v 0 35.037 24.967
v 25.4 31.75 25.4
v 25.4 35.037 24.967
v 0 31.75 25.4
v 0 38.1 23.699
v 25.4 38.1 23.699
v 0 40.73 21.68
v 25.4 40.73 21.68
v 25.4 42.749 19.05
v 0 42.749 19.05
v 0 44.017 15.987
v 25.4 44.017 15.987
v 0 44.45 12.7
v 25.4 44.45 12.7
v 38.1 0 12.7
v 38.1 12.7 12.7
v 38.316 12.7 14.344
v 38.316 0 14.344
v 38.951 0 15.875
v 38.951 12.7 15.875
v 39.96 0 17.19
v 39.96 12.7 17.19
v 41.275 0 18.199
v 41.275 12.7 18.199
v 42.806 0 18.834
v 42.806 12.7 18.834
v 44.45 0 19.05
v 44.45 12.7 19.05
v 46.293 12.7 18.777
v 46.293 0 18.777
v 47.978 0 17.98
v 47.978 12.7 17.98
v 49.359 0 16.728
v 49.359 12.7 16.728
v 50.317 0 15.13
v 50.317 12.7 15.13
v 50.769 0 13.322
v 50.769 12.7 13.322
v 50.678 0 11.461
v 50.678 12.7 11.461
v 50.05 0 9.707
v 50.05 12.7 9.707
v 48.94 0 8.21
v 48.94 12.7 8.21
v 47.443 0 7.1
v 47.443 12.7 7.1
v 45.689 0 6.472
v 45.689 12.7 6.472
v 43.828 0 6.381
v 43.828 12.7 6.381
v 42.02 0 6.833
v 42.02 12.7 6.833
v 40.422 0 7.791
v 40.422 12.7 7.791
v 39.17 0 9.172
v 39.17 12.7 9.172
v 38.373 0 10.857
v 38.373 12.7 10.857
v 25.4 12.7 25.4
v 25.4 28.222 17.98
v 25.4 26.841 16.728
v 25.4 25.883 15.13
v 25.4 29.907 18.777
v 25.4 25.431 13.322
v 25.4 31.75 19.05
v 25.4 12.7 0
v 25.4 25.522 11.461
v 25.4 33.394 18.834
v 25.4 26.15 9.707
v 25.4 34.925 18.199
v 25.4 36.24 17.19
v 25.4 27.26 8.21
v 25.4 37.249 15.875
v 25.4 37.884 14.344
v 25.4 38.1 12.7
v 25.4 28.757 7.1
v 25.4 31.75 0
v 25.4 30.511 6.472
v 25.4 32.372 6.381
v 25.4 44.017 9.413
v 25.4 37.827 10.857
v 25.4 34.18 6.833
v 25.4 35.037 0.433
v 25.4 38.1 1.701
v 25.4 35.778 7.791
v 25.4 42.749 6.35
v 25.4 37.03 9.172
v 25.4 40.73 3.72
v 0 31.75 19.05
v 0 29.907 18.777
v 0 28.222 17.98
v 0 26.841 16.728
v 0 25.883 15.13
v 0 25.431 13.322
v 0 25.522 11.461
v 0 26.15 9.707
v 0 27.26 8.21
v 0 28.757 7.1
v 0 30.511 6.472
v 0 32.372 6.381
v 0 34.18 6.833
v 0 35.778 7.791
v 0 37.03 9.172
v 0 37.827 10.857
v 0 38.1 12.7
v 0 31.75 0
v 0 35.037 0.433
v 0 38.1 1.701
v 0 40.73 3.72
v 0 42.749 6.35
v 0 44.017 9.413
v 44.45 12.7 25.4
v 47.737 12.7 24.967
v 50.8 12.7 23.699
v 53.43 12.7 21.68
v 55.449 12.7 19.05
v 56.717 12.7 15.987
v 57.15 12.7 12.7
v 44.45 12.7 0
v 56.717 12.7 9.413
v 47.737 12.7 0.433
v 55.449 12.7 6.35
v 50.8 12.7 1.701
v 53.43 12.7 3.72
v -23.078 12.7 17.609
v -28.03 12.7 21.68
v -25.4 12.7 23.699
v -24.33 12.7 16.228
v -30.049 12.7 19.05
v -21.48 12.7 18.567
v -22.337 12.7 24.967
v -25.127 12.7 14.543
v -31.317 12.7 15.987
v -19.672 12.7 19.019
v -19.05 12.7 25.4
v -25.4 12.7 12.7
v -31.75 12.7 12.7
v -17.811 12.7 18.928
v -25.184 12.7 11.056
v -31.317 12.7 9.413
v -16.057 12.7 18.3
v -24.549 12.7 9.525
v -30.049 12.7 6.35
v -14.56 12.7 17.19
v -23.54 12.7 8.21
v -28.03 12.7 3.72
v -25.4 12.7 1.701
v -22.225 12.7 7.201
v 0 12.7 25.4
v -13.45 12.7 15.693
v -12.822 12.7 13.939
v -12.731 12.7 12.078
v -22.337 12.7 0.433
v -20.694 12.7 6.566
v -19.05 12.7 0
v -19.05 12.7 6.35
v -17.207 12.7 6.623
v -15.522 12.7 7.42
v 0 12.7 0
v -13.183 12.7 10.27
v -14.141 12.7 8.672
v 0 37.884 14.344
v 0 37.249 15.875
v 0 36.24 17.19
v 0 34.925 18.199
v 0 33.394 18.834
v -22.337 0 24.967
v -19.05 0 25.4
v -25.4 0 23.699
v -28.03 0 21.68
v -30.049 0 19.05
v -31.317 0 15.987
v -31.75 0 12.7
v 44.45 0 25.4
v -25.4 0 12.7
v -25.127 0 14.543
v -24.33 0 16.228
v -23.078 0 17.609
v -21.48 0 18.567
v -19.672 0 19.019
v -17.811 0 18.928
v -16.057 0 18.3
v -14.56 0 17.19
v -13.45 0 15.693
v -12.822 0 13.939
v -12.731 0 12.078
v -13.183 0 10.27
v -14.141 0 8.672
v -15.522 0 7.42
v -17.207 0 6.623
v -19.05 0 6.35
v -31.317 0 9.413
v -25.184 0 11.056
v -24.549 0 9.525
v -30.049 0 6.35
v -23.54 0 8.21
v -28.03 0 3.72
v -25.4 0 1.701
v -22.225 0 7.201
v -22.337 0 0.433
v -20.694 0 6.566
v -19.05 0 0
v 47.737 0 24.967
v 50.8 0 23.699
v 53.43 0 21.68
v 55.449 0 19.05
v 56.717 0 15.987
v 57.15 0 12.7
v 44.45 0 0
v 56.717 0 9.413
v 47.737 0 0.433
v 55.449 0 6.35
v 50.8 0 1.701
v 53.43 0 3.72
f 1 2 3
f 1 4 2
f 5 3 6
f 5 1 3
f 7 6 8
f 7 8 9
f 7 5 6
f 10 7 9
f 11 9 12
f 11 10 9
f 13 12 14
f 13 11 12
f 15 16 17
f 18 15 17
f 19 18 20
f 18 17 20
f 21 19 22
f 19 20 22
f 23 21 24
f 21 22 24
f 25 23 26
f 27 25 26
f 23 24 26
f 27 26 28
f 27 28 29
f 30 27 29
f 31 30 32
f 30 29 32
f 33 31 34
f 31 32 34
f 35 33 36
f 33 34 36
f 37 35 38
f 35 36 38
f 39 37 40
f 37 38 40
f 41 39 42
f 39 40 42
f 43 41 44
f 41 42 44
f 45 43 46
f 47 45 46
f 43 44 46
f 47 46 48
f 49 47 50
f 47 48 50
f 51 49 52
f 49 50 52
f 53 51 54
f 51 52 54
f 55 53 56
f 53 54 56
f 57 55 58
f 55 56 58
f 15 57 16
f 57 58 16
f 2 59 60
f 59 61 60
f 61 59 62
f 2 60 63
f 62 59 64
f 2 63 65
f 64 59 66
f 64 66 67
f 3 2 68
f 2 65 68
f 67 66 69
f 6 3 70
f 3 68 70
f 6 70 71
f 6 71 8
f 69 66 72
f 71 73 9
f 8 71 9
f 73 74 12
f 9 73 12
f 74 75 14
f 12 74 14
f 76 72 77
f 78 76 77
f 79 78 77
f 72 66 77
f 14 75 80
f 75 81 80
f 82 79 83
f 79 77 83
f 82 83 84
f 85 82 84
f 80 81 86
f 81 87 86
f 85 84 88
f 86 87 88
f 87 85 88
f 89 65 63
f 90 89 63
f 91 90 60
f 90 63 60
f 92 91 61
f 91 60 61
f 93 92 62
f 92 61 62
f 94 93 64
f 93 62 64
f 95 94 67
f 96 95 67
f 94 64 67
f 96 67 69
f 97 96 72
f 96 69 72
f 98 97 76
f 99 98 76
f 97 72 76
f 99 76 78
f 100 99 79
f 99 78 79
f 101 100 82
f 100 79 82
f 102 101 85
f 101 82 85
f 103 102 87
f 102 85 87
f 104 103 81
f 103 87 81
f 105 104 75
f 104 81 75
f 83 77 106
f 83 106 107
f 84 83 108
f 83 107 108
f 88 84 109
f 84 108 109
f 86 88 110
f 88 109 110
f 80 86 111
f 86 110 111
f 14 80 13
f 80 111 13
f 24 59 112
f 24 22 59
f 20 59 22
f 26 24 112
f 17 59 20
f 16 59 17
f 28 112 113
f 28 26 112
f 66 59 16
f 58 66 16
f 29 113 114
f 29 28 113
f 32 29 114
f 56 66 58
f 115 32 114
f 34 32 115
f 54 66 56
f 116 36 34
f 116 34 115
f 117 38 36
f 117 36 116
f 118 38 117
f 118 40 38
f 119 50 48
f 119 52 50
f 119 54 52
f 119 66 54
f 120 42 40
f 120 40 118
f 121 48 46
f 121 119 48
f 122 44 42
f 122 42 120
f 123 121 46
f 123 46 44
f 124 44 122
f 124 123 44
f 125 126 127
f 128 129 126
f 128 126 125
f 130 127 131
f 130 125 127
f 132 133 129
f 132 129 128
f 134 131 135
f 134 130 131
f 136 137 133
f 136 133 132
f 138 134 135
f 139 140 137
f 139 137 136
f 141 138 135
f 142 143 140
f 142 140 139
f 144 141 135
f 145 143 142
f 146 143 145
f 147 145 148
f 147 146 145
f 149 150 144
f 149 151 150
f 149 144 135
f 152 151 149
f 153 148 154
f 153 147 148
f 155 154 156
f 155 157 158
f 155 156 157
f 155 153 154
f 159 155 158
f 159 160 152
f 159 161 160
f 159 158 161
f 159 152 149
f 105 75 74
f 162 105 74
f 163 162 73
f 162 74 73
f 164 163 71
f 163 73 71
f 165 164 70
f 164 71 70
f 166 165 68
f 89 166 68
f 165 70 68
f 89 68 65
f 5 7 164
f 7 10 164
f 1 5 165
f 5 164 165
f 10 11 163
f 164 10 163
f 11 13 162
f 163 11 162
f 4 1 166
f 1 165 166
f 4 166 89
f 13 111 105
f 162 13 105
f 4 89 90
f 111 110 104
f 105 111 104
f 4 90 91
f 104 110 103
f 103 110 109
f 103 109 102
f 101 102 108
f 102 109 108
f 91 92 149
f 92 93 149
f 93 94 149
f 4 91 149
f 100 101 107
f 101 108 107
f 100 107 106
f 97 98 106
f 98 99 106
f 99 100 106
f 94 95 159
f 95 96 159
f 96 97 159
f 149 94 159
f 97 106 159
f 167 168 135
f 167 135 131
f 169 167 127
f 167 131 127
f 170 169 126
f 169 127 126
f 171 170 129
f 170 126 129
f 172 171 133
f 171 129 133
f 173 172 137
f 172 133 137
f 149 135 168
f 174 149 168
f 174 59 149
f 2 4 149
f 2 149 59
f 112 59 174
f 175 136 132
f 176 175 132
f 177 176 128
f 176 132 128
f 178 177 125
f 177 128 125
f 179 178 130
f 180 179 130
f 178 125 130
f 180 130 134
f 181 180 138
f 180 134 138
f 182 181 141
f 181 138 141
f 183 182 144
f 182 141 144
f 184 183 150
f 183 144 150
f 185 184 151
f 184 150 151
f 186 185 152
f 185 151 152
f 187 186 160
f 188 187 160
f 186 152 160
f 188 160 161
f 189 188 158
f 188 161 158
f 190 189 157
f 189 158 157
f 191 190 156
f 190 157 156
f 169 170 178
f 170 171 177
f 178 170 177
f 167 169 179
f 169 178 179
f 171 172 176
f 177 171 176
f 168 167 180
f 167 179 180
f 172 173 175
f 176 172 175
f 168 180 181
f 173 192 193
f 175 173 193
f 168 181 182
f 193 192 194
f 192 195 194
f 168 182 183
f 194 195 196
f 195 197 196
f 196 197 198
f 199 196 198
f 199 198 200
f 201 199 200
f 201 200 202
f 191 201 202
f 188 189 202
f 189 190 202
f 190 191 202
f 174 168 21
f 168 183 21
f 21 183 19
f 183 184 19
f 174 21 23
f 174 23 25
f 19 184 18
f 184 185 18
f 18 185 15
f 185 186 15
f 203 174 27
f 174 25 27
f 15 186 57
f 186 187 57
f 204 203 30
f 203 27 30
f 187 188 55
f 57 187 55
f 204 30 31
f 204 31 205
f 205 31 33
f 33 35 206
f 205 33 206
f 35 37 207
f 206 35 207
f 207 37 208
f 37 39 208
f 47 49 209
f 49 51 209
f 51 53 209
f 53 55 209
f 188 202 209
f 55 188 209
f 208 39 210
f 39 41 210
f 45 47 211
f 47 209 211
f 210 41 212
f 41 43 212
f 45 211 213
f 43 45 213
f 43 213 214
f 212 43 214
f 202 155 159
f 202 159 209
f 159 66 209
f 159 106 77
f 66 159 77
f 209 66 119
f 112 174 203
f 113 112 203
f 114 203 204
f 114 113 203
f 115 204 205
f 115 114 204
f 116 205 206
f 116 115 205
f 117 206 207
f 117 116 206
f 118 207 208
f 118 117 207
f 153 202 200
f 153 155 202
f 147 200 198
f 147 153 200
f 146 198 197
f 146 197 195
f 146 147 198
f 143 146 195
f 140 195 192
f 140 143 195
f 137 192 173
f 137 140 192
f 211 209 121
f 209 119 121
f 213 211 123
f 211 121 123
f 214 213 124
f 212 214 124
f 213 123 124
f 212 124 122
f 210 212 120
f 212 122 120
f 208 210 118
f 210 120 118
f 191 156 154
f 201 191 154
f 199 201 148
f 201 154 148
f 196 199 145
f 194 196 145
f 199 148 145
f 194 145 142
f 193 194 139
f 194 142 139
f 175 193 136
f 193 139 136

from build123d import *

# Parameters (mm, degrees)
F0_W     = 31.75
F0_H     = 12.7
F1_DEPTH = 25.4
F3_DEPTH = 25.4
F5_DEPTH = 25.4
F7_DEPTH = 25.4
F8_R     = 12.69999


# Not quite as in the source:
# - a fillet or chamfer is up to 0.001 mm smaller than in the source, because OpenCascade refuses the exact size


with BuildPart() as f1:
    # F0 (on Top) → F1 (new body)
    with BuildSketch(Plane.XY):
        Polygon((0, 12.7), (0, 0), (25.4, 0), (25.4, 12.7), (25.4, 44.45), (0, 44.45), align=None)
        with Locations((-15.875, 6.35)):
            Rectangle(F0_W, F0_H)
        with Locations((41.275, 6.35)):
            Rectangle(F0_W, F0_H)
    extrude(amount=F1_DEPTH)

    # F2 (on face) → F3 (cut)
    with BuildSketch(Plane.YZ.offset(25.4)):
        with BuildLine():
            ThreePointArc((38.1, 12.7), (36.2401280605, 17.1901280605), (31.75, 19.05))
            ThreePointArc((31.75, 19.05), (27.2598719395, 8.2098719395), (38.1, 12.7))
        make_face()
    extrude(amount=-F3_DEPTH, mode=Mode.SUBTRACT)

    # F4 (on face) → F5 (cut)
    with BuildSketch(Plane(origin=(0, 12.7, 0), x_dir=(-1, 0, 0), z_dir=(0, 1, 0))):
        with BuildLine():
            ThreePointArc((-44.45, 19.05), (-48.9401280605, 8.2098719395), (-38.1, 12.7))
            ThreePointArc((-38.1, 12.7), (-39.9598719395, 17.1901280605), (-44.45, 19.05))
        make_face()
    extrude(amount=-F5_DEPTH, mode=Mode.SUBTRACT)

    # F6 (on face) → F7 (cut)
    with BuildSketch(Plane(origin=(0, 12.7, 0), x_dir=(-1, 0, 0), z_dir=(0, 1, 0))):
        with BuildLine():
            ThreePointArc((19.05, 6.35), (23.5401280605, 8.2098719395), (25.4, 12.7))
            ThreePointArc((25.4, 12.7), (14.5598719395, 17.1901280605), (19.05, 6.35))
        make_face()
    extrude(amount=-F7_DEPTH, mode=Mode.SUBTRACT)

    # F8 (radius 12.7 in the source; OpenCascade refuses exactly that, so slightly less here)
    f8_edges = [f1.edges().sort_by_distance(p)[0] for p in [
        (57.15, 6.35, 25.4),
        (57.15, 6.35, 0),
        (12.7, 44.45, 25.4),
        (12.7, 44.45, 0),
        (-31.75, 6.35, 0),
        (-31.75, 6.35, 25.4),
    ]]
    fillet(f8_edges, radius=F8_R)


solid = f1.part
